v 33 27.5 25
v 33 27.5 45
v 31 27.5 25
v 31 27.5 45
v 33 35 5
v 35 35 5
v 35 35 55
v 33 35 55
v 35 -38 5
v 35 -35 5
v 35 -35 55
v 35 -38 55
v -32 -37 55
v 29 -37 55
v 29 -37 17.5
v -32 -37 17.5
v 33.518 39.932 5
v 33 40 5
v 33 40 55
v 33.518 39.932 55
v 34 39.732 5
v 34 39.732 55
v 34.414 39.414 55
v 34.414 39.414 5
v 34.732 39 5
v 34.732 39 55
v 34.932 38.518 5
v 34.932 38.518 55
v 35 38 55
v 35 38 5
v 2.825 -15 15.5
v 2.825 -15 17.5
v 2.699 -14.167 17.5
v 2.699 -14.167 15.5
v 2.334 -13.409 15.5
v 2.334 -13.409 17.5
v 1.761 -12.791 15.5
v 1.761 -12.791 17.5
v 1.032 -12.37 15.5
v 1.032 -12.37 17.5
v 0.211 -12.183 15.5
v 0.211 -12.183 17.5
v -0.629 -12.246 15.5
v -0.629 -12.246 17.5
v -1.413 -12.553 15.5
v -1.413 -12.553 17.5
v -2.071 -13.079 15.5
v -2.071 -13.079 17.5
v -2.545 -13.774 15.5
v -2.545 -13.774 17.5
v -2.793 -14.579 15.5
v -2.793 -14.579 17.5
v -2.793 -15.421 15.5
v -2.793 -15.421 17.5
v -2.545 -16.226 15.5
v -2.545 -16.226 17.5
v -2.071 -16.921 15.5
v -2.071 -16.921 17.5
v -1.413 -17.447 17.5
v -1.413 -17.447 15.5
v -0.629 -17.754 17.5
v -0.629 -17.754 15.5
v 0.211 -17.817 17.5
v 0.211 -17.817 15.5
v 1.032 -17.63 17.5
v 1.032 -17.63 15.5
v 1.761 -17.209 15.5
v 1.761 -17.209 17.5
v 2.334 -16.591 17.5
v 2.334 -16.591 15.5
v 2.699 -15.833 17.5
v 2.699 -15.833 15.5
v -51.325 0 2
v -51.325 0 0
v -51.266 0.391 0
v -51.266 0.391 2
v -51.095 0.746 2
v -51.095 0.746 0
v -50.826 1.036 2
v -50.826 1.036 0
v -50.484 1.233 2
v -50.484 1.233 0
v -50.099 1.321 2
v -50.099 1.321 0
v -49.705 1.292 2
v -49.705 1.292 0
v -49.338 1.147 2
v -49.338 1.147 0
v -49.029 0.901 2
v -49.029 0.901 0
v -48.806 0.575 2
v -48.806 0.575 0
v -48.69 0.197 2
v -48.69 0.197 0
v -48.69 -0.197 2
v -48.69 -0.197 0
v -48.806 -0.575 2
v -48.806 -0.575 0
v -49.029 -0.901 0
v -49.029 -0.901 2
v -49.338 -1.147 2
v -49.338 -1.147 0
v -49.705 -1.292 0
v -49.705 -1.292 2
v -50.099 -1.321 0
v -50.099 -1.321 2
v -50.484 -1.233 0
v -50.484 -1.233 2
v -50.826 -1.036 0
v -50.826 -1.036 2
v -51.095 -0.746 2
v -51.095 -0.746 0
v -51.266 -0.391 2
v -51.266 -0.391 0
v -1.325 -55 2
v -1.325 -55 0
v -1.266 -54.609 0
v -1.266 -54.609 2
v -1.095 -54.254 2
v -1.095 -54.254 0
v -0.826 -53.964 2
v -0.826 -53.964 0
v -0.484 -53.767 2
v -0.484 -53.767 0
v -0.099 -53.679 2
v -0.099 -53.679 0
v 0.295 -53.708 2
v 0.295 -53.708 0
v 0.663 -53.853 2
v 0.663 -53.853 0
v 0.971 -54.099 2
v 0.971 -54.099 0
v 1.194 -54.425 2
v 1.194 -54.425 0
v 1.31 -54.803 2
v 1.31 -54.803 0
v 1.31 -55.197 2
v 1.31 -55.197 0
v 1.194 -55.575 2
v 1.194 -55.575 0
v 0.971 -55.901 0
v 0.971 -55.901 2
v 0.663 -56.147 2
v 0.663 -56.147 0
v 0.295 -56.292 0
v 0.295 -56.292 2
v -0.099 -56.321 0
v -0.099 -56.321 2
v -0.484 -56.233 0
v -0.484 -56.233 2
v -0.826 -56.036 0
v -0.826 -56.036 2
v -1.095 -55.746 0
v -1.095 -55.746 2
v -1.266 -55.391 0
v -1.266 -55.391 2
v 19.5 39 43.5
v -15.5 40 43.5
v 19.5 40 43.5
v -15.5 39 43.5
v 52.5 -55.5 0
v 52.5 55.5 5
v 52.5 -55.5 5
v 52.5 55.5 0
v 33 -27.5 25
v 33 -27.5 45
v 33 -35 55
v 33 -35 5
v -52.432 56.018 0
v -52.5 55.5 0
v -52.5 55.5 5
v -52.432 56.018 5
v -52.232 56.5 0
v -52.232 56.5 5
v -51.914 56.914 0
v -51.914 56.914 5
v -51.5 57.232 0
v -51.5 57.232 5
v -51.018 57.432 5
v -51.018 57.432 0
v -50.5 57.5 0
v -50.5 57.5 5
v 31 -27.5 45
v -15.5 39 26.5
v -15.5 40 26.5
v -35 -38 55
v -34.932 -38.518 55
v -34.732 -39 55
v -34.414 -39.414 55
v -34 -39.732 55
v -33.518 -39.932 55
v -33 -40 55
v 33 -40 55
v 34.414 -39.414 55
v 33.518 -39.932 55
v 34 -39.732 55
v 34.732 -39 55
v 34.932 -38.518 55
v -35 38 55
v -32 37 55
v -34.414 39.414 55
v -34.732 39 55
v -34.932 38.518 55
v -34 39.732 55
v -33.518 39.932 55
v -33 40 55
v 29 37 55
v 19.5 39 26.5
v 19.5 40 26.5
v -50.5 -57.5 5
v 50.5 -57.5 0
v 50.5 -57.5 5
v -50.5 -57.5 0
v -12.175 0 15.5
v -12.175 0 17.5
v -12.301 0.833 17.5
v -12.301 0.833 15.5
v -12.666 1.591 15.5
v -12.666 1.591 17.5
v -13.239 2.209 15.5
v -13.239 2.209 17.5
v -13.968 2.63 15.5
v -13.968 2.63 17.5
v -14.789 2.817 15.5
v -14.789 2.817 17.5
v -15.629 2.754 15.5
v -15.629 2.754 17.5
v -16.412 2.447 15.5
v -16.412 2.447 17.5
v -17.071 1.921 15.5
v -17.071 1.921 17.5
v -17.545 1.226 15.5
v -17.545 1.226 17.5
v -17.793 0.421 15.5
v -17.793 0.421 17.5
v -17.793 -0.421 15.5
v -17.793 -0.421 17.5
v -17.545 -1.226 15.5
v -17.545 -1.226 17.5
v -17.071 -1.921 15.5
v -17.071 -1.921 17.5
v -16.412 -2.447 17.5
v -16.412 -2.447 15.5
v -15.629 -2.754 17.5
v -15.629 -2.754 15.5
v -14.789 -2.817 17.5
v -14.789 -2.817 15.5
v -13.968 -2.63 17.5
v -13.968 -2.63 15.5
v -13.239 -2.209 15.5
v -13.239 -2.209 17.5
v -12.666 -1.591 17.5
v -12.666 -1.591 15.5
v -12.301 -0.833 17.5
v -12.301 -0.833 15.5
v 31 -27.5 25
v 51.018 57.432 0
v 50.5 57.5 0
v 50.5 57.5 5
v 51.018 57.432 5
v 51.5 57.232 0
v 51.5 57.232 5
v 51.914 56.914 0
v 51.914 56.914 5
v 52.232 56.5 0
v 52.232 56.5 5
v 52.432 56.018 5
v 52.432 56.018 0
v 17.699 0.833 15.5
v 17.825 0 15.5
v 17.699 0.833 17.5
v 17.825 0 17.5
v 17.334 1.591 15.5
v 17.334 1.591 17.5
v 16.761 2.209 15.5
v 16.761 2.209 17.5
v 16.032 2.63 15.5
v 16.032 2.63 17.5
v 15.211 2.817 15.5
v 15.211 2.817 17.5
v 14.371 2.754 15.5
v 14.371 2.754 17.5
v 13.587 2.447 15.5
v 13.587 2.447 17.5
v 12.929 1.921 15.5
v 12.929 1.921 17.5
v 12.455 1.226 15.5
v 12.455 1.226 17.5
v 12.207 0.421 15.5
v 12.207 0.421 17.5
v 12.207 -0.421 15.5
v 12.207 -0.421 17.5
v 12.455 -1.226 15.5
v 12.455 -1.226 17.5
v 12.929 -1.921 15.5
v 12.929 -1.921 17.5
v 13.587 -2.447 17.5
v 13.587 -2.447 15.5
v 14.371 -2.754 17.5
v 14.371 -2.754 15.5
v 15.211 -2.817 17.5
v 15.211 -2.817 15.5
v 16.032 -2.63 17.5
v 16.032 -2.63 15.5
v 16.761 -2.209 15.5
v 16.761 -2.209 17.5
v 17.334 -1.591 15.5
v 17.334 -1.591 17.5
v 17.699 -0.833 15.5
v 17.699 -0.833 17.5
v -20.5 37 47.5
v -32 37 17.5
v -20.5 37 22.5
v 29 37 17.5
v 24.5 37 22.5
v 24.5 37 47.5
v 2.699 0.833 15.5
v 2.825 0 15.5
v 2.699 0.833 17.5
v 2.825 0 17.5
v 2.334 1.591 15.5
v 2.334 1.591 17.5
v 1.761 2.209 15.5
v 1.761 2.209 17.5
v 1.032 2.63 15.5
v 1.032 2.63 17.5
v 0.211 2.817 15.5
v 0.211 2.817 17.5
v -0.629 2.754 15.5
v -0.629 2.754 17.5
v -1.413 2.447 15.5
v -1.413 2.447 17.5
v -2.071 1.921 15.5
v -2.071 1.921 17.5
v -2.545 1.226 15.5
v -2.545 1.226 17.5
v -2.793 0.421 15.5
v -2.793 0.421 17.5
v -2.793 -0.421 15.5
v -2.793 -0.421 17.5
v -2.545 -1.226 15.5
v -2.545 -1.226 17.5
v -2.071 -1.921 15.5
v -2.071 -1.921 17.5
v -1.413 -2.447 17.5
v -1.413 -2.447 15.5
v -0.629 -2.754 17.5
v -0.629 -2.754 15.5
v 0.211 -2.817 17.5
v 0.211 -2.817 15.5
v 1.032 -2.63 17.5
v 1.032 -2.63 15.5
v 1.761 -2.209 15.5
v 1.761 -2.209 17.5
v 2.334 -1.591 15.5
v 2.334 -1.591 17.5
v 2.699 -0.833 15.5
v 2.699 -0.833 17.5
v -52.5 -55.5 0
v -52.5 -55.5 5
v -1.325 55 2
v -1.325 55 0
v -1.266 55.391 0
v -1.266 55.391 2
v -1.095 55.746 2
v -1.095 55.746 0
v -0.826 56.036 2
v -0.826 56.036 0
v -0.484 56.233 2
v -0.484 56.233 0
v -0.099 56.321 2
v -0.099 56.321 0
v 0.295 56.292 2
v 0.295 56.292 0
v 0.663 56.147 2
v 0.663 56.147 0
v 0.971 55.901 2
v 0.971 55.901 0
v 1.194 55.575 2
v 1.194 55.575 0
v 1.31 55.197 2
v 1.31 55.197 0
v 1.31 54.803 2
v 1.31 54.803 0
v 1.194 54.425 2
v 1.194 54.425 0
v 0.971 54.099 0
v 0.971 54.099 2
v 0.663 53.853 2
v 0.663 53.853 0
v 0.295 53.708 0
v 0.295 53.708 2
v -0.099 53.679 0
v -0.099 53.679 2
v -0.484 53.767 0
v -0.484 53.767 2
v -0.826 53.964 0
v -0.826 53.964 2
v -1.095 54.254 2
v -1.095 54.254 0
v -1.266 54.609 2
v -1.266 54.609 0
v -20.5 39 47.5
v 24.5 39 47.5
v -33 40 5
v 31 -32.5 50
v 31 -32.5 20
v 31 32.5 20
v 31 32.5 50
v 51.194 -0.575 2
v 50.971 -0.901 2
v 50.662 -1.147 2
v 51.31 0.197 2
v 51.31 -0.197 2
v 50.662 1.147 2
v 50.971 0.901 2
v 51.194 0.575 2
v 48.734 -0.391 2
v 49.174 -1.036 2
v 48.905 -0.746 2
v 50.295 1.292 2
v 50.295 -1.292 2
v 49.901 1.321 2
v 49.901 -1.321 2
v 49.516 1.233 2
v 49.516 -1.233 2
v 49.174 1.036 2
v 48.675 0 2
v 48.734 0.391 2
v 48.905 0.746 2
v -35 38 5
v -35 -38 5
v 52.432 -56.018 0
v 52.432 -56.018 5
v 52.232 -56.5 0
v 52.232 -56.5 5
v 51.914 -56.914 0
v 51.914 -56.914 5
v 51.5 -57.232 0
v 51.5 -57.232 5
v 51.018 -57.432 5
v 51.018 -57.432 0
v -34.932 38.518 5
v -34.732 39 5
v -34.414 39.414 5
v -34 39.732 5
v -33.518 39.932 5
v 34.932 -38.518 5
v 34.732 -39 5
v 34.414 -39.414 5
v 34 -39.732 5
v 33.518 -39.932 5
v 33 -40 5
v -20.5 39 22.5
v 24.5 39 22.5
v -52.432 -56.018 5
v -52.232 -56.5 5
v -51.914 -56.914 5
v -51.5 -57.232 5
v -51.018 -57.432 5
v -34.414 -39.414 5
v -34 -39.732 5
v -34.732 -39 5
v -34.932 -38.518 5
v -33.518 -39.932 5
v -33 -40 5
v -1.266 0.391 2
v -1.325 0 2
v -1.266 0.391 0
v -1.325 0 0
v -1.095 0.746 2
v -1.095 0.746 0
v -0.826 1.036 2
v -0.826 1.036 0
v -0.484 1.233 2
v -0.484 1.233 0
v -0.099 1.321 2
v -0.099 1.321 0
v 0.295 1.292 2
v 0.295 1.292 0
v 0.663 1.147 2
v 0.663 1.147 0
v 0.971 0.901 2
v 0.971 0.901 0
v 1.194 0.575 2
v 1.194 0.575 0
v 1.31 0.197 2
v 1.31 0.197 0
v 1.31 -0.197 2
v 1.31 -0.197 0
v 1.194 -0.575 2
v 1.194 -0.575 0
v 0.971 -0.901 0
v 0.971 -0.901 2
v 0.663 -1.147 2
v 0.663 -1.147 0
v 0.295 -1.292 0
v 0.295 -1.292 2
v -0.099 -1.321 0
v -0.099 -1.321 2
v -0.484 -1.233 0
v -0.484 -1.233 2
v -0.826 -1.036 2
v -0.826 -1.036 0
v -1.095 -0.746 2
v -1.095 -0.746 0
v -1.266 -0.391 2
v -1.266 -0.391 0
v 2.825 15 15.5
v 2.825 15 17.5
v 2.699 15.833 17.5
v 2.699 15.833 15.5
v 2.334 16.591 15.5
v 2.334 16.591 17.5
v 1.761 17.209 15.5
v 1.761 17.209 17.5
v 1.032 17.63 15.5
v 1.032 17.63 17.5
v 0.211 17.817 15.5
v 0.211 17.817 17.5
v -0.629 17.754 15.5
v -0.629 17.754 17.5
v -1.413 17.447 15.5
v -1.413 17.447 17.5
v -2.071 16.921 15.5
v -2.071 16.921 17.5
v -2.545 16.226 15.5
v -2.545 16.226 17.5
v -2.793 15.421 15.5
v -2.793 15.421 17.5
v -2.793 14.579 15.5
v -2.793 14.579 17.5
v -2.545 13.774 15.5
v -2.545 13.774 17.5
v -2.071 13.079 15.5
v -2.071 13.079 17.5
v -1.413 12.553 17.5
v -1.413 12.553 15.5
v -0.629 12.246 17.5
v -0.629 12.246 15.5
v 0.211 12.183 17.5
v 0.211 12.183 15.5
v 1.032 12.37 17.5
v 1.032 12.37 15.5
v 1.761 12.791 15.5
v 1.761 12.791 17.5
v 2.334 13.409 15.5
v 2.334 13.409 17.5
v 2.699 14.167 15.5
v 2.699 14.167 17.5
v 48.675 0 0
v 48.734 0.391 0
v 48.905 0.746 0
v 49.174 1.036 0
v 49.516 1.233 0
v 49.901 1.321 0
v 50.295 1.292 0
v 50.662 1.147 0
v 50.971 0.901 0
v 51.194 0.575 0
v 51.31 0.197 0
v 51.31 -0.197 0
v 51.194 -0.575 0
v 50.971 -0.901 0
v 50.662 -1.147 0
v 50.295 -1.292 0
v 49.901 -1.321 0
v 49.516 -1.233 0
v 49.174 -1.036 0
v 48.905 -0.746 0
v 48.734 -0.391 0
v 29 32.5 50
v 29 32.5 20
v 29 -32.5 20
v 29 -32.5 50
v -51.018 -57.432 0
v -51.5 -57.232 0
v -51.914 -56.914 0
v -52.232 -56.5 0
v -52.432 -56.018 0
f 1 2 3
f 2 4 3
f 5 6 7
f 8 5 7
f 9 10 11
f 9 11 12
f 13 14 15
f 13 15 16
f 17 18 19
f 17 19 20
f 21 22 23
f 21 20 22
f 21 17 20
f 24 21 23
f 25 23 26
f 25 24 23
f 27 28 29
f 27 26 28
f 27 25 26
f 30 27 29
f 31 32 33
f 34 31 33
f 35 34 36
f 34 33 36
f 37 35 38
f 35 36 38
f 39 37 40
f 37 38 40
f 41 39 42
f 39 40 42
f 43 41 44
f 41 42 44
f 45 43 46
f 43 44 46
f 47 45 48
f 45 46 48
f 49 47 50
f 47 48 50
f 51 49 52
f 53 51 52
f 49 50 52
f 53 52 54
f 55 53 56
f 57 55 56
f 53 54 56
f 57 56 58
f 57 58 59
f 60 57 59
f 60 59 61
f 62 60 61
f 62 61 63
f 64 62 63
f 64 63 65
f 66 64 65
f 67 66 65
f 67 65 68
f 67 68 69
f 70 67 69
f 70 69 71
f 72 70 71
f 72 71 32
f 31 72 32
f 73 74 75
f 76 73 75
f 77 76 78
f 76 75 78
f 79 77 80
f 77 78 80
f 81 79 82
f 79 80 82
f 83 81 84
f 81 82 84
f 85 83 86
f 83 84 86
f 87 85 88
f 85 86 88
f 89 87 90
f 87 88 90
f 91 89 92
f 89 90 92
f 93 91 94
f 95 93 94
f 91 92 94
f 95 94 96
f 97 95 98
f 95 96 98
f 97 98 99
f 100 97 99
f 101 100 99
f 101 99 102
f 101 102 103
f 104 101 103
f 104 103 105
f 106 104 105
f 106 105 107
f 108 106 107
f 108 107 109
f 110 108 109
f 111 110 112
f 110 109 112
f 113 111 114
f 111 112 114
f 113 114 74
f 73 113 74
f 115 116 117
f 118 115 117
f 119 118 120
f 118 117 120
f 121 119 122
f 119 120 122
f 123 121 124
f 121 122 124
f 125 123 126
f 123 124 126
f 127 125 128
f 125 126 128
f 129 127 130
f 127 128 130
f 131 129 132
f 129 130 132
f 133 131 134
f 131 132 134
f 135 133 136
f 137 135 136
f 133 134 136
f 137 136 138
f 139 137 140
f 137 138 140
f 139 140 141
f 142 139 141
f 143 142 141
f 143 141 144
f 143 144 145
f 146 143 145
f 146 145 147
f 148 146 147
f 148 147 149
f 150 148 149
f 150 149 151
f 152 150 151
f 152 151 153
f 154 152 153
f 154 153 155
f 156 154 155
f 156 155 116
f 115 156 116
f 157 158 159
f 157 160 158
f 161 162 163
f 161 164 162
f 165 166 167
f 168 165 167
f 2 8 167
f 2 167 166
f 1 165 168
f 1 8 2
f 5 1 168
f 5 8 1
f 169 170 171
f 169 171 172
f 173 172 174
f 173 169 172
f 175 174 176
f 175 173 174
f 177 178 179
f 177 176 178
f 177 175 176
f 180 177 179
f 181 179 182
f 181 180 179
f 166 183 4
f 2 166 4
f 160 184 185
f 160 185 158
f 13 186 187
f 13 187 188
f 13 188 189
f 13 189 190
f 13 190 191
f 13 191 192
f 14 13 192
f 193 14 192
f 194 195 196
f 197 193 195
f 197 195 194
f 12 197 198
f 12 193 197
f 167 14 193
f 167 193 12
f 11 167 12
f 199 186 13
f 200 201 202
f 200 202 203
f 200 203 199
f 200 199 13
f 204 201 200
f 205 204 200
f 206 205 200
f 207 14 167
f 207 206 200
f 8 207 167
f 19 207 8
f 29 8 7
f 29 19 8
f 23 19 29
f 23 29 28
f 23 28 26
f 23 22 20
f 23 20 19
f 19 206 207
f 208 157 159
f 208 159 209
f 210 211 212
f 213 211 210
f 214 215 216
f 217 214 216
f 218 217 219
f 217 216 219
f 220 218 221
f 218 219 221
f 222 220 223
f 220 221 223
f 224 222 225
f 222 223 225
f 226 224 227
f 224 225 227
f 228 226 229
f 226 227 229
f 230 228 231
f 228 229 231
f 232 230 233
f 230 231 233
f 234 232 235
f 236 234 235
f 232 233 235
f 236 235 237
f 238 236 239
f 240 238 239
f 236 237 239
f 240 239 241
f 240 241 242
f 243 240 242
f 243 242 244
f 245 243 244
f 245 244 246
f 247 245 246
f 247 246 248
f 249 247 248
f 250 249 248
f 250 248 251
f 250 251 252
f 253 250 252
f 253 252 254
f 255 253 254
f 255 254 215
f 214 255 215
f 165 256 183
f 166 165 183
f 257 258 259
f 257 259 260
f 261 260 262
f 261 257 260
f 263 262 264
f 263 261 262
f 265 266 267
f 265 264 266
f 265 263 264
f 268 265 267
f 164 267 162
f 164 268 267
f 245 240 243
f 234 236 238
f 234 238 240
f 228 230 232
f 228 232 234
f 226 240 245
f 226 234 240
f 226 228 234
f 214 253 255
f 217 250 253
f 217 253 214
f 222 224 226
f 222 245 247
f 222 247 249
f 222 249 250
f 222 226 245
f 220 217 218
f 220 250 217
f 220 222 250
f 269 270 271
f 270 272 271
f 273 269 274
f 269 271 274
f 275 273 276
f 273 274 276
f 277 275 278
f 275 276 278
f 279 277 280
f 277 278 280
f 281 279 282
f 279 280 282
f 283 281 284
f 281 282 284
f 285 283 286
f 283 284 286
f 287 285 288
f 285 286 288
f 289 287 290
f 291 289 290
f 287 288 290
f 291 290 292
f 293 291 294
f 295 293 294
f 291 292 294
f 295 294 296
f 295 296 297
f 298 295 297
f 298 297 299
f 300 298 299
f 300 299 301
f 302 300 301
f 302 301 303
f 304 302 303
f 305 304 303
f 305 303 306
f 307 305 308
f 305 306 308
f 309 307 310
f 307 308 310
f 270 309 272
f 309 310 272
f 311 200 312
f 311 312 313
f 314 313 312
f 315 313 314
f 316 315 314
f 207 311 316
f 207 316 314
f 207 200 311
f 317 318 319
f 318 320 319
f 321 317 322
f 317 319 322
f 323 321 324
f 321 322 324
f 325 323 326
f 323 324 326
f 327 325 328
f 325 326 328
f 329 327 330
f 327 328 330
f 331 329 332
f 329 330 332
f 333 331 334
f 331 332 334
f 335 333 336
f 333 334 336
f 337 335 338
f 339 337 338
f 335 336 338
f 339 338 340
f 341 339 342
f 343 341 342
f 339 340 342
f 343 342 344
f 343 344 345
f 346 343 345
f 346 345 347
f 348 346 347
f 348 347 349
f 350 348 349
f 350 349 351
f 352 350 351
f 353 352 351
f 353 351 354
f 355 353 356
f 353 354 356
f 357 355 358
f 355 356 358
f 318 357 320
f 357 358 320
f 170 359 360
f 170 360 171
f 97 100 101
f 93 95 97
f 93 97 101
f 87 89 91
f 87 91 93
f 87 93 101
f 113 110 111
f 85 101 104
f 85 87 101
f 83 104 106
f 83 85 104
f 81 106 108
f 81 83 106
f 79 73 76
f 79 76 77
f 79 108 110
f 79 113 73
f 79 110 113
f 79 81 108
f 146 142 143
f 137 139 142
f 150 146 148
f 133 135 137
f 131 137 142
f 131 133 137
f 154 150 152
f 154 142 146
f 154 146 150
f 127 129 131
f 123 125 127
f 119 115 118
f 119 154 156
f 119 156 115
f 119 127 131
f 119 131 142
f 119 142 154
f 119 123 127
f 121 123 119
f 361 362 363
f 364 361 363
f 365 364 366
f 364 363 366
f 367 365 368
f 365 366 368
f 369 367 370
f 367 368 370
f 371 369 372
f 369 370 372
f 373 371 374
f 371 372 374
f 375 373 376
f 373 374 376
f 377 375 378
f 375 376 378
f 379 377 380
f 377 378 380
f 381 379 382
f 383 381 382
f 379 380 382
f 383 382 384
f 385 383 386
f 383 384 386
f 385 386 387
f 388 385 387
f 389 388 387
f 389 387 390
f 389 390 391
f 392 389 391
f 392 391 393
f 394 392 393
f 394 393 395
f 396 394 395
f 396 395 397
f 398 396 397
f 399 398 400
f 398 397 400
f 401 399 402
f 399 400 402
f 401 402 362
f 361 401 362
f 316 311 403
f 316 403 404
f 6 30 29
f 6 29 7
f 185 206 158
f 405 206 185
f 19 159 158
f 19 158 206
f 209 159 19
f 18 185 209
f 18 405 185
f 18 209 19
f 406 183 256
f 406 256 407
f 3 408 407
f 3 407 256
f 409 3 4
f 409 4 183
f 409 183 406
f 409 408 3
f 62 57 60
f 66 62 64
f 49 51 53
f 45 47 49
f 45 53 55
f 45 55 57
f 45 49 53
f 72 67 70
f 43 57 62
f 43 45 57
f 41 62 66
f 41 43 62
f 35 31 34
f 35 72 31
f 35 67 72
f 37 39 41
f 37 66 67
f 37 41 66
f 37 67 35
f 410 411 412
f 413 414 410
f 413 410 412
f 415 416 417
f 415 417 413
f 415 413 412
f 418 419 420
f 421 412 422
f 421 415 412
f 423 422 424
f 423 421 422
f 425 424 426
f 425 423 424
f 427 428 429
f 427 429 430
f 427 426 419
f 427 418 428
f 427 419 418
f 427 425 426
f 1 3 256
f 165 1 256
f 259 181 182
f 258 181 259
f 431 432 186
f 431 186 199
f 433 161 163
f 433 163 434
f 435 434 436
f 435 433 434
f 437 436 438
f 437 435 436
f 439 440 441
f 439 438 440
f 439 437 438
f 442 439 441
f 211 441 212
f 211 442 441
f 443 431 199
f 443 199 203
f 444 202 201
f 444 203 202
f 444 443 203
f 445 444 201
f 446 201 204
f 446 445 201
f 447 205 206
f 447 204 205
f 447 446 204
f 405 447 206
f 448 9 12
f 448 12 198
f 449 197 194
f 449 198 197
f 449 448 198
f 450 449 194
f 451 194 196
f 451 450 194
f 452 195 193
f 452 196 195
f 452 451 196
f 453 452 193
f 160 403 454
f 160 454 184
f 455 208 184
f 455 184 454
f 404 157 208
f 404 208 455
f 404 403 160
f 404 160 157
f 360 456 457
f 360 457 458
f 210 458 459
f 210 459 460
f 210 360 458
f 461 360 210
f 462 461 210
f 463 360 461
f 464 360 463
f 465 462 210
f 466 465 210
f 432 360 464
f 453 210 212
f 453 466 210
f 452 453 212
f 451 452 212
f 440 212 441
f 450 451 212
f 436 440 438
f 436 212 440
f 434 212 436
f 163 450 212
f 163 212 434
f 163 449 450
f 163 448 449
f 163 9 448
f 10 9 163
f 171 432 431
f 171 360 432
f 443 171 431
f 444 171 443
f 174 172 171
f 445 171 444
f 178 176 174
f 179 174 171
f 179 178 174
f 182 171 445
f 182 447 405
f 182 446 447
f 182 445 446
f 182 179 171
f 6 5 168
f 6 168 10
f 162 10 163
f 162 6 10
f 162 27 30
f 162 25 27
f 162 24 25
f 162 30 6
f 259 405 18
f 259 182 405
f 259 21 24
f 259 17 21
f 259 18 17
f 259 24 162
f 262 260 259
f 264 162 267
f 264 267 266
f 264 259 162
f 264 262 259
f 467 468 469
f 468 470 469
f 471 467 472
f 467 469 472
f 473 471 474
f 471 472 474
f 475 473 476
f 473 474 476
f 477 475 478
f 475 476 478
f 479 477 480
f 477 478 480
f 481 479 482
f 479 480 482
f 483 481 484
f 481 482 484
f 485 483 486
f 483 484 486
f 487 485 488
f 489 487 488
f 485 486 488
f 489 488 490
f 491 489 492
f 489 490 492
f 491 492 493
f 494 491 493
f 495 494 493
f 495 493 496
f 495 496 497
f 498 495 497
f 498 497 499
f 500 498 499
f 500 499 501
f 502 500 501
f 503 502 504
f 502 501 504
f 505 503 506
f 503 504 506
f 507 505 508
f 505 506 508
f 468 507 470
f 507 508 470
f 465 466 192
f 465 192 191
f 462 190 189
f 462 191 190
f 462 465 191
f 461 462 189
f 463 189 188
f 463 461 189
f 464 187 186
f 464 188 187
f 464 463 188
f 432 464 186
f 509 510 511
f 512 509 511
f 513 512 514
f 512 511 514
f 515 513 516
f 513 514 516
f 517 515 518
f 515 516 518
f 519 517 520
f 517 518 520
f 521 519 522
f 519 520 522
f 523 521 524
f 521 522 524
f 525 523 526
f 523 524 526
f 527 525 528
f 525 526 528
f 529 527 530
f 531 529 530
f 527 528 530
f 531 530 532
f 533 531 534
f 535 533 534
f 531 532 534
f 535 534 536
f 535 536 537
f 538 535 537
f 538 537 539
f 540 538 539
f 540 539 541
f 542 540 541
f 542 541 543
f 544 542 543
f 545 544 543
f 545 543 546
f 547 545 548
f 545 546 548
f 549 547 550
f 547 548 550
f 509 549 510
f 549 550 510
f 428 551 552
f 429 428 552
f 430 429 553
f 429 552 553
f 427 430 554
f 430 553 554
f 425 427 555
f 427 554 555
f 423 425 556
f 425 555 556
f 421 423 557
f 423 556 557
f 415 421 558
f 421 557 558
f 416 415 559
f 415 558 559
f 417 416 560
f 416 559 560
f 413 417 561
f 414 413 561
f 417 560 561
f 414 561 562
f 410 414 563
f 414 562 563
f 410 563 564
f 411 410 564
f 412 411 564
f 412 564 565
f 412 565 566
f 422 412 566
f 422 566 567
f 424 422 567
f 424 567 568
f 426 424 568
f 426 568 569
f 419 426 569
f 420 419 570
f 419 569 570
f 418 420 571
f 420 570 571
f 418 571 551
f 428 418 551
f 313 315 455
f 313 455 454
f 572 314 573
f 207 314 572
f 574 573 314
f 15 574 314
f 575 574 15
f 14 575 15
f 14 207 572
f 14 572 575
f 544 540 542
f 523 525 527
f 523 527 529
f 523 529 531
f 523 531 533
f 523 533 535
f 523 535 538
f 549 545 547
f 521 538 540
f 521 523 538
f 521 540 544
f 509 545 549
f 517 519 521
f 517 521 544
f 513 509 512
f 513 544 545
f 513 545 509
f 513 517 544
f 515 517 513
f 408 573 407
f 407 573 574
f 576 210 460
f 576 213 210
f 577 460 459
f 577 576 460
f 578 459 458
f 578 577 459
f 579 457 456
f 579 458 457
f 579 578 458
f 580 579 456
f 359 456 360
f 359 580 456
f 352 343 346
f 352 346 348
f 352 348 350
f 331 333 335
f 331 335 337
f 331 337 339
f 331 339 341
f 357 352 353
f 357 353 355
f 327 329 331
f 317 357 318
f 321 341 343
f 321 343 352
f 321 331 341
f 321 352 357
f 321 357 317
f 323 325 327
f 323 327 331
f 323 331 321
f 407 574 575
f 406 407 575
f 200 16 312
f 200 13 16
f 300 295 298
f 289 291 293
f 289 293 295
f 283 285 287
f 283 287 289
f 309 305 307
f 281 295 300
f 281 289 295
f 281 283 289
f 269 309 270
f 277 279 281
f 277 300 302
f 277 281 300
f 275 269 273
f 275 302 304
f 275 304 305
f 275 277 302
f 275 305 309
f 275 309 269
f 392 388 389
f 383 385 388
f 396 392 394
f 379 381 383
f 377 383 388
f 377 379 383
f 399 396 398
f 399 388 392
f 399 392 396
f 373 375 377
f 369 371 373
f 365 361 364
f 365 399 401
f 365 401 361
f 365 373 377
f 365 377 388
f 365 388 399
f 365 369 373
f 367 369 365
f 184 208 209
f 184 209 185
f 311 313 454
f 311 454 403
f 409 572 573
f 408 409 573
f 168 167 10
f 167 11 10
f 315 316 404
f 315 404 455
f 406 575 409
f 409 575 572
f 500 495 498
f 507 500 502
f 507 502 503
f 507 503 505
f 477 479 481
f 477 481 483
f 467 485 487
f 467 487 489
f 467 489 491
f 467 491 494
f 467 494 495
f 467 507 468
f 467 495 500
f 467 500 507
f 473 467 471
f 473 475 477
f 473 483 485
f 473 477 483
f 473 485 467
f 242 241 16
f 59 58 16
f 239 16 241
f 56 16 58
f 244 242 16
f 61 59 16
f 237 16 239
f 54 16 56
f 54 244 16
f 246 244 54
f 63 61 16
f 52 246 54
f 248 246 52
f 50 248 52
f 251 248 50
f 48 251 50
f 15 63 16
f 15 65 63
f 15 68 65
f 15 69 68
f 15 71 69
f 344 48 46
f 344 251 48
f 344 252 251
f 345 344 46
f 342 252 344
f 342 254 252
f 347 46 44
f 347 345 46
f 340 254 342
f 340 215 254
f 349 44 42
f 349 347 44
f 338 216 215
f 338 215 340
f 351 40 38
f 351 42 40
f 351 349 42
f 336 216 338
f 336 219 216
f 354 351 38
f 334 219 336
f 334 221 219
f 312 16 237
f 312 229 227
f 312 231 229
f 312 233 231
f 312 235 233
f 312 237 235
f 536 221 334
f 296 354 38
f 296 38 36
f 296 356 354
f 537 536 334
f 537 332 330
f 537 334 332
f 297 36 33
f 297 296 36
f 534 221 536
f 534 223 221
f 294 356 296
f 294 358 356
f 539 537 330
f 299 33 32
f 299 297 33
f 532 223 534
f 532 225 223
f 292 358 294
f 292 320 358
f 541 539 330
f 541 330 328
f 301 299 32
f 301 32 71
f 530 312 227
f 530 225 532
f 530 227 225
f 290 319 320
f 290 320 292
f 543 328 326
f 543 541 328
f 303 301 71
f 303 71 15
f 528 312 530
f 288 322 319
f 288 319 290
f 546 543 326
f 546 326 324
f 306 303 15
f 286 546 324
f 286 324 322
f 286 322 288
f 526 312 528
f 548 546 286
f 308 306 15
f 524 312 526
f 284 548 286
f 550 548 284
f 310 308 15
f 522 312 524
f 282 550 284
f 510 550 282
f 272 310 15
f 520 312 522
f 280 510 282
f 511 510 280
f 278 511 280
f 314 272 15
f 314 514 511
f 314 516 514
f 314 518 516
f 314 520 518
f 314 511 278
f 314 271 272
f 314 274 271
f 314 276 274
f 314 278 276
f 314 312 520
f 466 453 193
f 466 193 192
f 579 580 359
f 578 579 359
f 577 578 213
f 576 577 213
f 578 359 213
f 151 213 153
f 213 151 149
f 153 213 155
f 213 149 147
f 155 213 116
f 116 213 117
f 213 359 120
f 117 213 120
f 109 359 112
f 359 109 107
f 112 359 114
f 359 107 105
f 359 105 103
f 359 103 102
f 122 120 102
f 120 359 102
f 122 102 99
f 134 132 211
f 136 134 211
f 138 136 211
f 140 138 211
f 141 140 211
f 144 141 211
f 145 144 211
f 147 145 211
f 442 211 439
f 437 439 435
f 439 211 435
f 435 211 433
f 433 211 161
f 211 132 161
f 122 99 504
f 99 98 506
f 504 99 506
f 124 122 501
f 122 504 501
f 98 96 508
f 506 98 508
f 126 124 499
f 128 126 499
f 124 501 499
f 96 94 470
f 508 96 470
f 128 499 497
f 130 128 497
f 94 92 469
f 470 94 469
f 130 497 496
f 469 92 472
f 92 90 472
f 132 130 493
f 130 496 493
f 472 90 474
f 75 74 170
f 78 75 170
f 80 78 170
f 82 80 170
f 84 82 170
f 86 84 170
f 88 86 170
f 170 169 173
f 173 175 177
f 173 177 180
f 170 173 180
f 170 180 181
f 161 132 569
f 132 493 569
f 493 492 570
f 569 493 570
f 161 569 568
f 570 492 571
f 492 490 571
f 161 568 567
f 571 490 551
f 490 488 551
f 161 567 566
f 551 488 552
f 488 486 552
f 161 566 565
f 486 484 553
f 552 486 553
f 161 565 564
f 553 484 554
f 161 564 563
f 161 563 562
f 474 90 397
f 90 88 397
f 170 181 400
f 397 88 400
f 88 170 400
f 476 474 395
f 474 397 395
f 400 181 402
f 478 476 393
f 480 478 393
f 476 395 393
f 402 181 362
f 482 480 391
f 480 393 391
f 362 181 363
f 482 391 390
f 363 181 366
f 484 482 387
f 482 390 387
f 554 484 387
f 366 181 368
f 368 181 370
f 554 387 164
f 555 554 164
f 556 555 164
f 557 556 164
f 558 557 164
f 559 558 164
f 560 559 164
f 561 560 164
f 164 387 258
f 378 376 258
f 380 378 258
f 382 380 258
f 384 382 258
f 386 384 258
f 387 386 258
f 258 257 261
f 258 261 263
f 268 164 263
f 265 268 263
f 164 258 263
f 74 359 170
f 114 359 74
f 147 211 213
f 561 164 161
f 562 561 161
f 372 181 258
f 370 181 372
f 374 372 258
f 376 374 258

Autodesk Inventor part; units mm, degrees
ref_plane "YZ Plane" through (0, 0, 0) normal (1, 0, 0) x (0, 1, 0)
ref_plane "XZ Plane" through (0, 0, 0) normal (0, 1, 0) x (-1, 0, 0)
ref_plane "XY Plane" through (0, 0, 0) normal (0, 0, 1) x (1, 0, 0)
sketch "Sketch1" plane through (0, 0, 0) normal (0, 0, 1) x (1, 0, 0)
  line L0 (-40.5, 47.5) -> (40.5, 47.5)
  line L1 (42.5, 45.5) -> (42.5, -45.5)
  line L2 (40.5, -47.5) -> (-40.5, -47.5)
  line L3 (-42.5, -45.5) -> (-42.5, 45.5)
  arc A0 (-40.5, 47.5) -> (-42.5, 45.5) centre (-40.5, 45.5) ccw
  arc A1 (-42.5, -45.5) -> (-40.5, -47.5) centre (-40.5, -45.5) ccw
  arc A2 (40.5, -47.5) -> (42.5, -45.5) centre (40.5, -45.5) ccw
  arc A3 (42.5, 45.5) -> (40.5, 47.5) centre (40.5, 45.5) ccw
  line L4 (-50.5, 57.5) -> (50.5, 57.5)
  line L5 (52.5, 55.5) -> (52.5, -55.5)
  line L6 (50.5, -57.5) -> (-50.5, -57.5)
  line L7 (-52.5, -55.5) -> (-52.5, 55.5)
  arc A4 (-50.5, 57.5) -> (-52.5, 55.5) centre (-50.5, 55.5) ccw
  arc A5 (-52.5, -55.5) -> (-50.5, -57.5) centre (-50.5, -55.5) ccw
  arc A6 (50.5, -57.5) -> (52.5, -55.5) centre (50.5, -55.5) ccw
  arc A7 (52.5, 55.5) -> (50.5, 57.5) centre (50.5, 55.5) ccw
  point P0 (0, 0)
  point P1 (-42.5, 47.5)
  point P2 (42.5, -47.5)
  point P3 (42.5, 47.5)
  dimension "d0" = 85
  dimension "d1" = 95
  dimension "d2" = 47.5
  dimension "d3" = 42.5
  dimension "d4" = 2
  dimension "d5" = 10
  dimension "d6" = 10
  dimension "d7" = 10
  dimension "d8" = 10
  dimension "d9" = 2
extrude "chamberBase" add sketch "Sketch1" along normal blind 5 contours L0 A3 L1 A2 L2 A1 L3 A0 | L4 A7 L5 A6 L6 A5 L7 A4
sketch "Sketch2" plane through (0, 0, 5) normal (0, 0, 1) x (1, 0, 0)
  line L0 (-33, 40) -> (33, 40)
  line L1 (35, 38) -> (35, -38)
  line L2 (33, -40) -> (-33, -40)
  line L3 (-35, -38) -> (-35, 38)
  arc A0 (-33, 40) -> (-35, 38) centre (-33, 38) ccw
  arc A1 (-35, -38) -> (-33, -40) centre (-33, -38) ccw
  arc A2 (33, -40) -> (35, -38) centre (33, -38) ccw
  arc A3 (35, 38) -> (33, 40) centre (33, 38) ccw
  point P0 (0, 0)
  point P1 (-35, 40)
  point P2 (35, -40)
  point P3 (35, 40)
  dimension "d12" = 70
  dimension "d13" = 80
  dimension "d14" = 40
  dimension "d15" = 35
  dimension "d16" = 2
extrude "chamberWallExt" add sketch "Sketch2" along normal blind 50
sketch "Sketch3" plane through (0, 0, 55) normal (0, 0, 1) x (1, 0, 0)
  line L0 (-32, 37) -> (29, 37)
  line L1 (29, 37) -> (29, -37)
  line L2 (29, -37) -> (-32, -37)
  line L3 (-32, -37) -> (-32, 37)
  line L4 (-33, 40) -> (33, 40) projected
  line L5 (35, -38) -> (35, 38) projected
  line L6 (-33, -40) -> (33, -40) projected
  line L7 (-35, -38) -> (-35, 38) projected
  point P0 (0, 0)
  dimension "d19" = 3
  dimension "d21" = 3
  dimension "d46" = 3
  dimension "d47" = 6
extrude "chamberIntExt" cut sketch "Sketch3" against normal blind 37.5
sketch "Sketch4" plane through (29, -37, 55) normal (-1, 0, 0) x (0, 0, 1)
  line L0 (-5, 69.5) -> (-35, 69.5)
  line L1 (-35, 69.5) -> (-35, 4.5)
  line L2 (-35, 4.5) -> (-5, 4.5)
  line L3 (-5, 4.5) -> (-5, 69.5)
  line L4 (-50, -18.5) -> (-50, 92.5) projected
  point P0 (-55, 37)
  dimension "d25" = 65
  dimension "d26" = 30
  dimension "d27" = 32.5
  dimension "d28" = 45
extrude "rectCoverSlipMountExt" cut sketch "Sketch4" against normal blind 2
sketch "Sketch5" plane through (31, -37, 55) normal (-1, 0, 0) x (0, 0, 1)
  line L0 (-10, 64.5) -> (-30, 64.5)
  line L1 (-30, 64.5) -> (-30, 9.5)
  line L2 (-30, 9.5) -> (-10, 9.5)
  line L3 (-10, 9.5) -> (-10, 64.5)
  line L4 (-50, 92.5) -> (-50, -18.5) projected
  point P0 (-55, 37)
  dimension "d31" = 55
  dimension "d32" = 20
  dimension "d33" = 27.5
  dimension "d34" = 40
extrude "rectCoverSlipWindow" cut sketch "Sketch5" against normal up to surface (4 mm away)
sketch "Sketch7" plane through (35, -38, 5) normal (1, 0, 0) x (0, 0, -1)
  line L0 (-50, 3) -> (0, 3)
  line L1 (0, 3) -> (0, 73)
  line L2 (0, 73) -> (-50, 73)
  line L3 (-50, 73) -> (-50, 3)
  line L4 (-50, 0) -> (-50, 76) projected
  line L5 (0, 76) -> (0, 0) projected
  point P0 (5, 38)
  dimension "d42" = 70
  dimension "d43" = 35
extrude "illObjExt" cut sketch "Sketch7" against normal blind 2
sketch "Sketch8" plane through (-32, 37, 55) normal (0, -1, 0) x (1, 0, 0)
  line L0 (56.5, -32.5) -> (11.5, -32.5)
  line L1 (11.5, -32.5) -> (11.5, -7.5)
  line L2 (11.5, -7.5) -> (56.5, -7.5)
  line L3 (56.5, -7.5) -> (56.5, -32.5)
  line L4 (0, -37.5) -> (61, -37.5) projected
  line L5 (-18.5, -50) -> (82.5, -50) projected
  point P0 (32, -55)
  point P1 (61, -5)
  dimension "d48" = 25
  dimension "d49" = 45
  dimension "d52" = 42.5
  dimension "d109" = 4.5
extrude "viewingWindCoverSlipMount" cut sketch "Sketch8" against normal blind 2
sketch "Sketch9" plane through (-32, 39, 55) normal (0, -1, 0) x (1, 0, 0)
  line L0 (16.5, -11.5) -> (51.5, -11.5)
  line L1 (51.5, -11.5) -> (51.5, -28.5)
  line L2 (51.5, -28.5) -> (16.5, -28.5)
  line L3 (16.5, -28.5) -> (16.5, -11.5)
  line L4 (82.5, -50) -> (-18.5, -50) projected
  line L5 (56.5, -7.5) -> (56.5, -32.5) projected
  point P0 (32, -55)
  dimension "d55" = 35
  dimension "d56" = 17
  dimension "d58" = 38.5
  dimension "d110" = 5
extrude "viewingWindExt" cut sketch "Sketch9" against normal up to surface (1 mm away)
sketch "Sketch10" plane through (0, 0, 17.5) normal (0, 0, 1) x (1, 0, 0)
  circle A0 centre (0, -15) radius 2.825
  circle A1 centre (15, 0) radius 2.825
  circle A2 centre (0, 15) radius 2.825
  circle A3 centre (-15, 0) radius 2.825
  circle A4 centre (0, 0) radius 2.825
  dimension "d70" = 5.65
  dimension "d71" = 5.65
  dimension "d72" = 5.65
  dimension "d73" = 5.65
  dimension "d74" = 5.65
  dimension "d75" = 15
  dimension "d76" = 15
  dimension "d77" = 15
  dimension "d78" = 15
extrude "sampleHolderMagnets" cut sketch "Sketch10" against normal blind 2
sketch "Sketch13" plane through (0, 0, 0) normal (0, 0, -1) x (-1, 0, 0)
  circle A0 centre (0, 55) radius 1.325
  circle A1 centre (-50, 0) radius 1.325
  circle A2 centre (0, -55) radius 1.325
  circle A3 centre (0, 0) radius 1.325
  circle A4 centre (50, 0) radius 1.325
  dimension "d98" = 2.65
  dimension "d99" = 2.65
  dimension "d100" = 2.65
  dimension "d101" = 2.65
  dimension "d102" = 2.65
  dimension "d103" = 55
  dimension "d104" = 55
  dimension "d105" = 50
  dimension "d106" = 50
extrude "xyStageMount" cut sketch "Sketch13" against normal blind 2
equation "\"d2\" = 0.5 * d1"
equation "\"d3\" = 0.5 * d0"
equation "\"d6\" = d5"
equation "\"d7\" = d5"
equation "\"d8\" = d5"
equation "\"d14\" = 0.5 * d13"
equation "\"d15\" = 0.5 * d12"
equation "\"d21\" = d19"
equation "\"d46\" = d19"
equation "\"d27\" = 0.5 * d25"
equation "\"d33\" = 0.5 * d31"
equation "\"d43\" = 0.5 * d42"
equation "\"d71\" = d70"
equation "\"d72\" = d70"
equation "\"d73\" = d70"
equation "\"d74\" = d70"
equation "\"d76\" = d75"
equation "\"d77\" = d75"
equation "\"d78\" = d75"
equation "\"d99\" = d98"
equation "\"d100\" = d98"
equation "\"d101\" = d98"
equation "\"d102\" = d98"
equation "\"d104\" = d103"
equation "\"d106\" = d105"
properties part number "sampleChamber"
